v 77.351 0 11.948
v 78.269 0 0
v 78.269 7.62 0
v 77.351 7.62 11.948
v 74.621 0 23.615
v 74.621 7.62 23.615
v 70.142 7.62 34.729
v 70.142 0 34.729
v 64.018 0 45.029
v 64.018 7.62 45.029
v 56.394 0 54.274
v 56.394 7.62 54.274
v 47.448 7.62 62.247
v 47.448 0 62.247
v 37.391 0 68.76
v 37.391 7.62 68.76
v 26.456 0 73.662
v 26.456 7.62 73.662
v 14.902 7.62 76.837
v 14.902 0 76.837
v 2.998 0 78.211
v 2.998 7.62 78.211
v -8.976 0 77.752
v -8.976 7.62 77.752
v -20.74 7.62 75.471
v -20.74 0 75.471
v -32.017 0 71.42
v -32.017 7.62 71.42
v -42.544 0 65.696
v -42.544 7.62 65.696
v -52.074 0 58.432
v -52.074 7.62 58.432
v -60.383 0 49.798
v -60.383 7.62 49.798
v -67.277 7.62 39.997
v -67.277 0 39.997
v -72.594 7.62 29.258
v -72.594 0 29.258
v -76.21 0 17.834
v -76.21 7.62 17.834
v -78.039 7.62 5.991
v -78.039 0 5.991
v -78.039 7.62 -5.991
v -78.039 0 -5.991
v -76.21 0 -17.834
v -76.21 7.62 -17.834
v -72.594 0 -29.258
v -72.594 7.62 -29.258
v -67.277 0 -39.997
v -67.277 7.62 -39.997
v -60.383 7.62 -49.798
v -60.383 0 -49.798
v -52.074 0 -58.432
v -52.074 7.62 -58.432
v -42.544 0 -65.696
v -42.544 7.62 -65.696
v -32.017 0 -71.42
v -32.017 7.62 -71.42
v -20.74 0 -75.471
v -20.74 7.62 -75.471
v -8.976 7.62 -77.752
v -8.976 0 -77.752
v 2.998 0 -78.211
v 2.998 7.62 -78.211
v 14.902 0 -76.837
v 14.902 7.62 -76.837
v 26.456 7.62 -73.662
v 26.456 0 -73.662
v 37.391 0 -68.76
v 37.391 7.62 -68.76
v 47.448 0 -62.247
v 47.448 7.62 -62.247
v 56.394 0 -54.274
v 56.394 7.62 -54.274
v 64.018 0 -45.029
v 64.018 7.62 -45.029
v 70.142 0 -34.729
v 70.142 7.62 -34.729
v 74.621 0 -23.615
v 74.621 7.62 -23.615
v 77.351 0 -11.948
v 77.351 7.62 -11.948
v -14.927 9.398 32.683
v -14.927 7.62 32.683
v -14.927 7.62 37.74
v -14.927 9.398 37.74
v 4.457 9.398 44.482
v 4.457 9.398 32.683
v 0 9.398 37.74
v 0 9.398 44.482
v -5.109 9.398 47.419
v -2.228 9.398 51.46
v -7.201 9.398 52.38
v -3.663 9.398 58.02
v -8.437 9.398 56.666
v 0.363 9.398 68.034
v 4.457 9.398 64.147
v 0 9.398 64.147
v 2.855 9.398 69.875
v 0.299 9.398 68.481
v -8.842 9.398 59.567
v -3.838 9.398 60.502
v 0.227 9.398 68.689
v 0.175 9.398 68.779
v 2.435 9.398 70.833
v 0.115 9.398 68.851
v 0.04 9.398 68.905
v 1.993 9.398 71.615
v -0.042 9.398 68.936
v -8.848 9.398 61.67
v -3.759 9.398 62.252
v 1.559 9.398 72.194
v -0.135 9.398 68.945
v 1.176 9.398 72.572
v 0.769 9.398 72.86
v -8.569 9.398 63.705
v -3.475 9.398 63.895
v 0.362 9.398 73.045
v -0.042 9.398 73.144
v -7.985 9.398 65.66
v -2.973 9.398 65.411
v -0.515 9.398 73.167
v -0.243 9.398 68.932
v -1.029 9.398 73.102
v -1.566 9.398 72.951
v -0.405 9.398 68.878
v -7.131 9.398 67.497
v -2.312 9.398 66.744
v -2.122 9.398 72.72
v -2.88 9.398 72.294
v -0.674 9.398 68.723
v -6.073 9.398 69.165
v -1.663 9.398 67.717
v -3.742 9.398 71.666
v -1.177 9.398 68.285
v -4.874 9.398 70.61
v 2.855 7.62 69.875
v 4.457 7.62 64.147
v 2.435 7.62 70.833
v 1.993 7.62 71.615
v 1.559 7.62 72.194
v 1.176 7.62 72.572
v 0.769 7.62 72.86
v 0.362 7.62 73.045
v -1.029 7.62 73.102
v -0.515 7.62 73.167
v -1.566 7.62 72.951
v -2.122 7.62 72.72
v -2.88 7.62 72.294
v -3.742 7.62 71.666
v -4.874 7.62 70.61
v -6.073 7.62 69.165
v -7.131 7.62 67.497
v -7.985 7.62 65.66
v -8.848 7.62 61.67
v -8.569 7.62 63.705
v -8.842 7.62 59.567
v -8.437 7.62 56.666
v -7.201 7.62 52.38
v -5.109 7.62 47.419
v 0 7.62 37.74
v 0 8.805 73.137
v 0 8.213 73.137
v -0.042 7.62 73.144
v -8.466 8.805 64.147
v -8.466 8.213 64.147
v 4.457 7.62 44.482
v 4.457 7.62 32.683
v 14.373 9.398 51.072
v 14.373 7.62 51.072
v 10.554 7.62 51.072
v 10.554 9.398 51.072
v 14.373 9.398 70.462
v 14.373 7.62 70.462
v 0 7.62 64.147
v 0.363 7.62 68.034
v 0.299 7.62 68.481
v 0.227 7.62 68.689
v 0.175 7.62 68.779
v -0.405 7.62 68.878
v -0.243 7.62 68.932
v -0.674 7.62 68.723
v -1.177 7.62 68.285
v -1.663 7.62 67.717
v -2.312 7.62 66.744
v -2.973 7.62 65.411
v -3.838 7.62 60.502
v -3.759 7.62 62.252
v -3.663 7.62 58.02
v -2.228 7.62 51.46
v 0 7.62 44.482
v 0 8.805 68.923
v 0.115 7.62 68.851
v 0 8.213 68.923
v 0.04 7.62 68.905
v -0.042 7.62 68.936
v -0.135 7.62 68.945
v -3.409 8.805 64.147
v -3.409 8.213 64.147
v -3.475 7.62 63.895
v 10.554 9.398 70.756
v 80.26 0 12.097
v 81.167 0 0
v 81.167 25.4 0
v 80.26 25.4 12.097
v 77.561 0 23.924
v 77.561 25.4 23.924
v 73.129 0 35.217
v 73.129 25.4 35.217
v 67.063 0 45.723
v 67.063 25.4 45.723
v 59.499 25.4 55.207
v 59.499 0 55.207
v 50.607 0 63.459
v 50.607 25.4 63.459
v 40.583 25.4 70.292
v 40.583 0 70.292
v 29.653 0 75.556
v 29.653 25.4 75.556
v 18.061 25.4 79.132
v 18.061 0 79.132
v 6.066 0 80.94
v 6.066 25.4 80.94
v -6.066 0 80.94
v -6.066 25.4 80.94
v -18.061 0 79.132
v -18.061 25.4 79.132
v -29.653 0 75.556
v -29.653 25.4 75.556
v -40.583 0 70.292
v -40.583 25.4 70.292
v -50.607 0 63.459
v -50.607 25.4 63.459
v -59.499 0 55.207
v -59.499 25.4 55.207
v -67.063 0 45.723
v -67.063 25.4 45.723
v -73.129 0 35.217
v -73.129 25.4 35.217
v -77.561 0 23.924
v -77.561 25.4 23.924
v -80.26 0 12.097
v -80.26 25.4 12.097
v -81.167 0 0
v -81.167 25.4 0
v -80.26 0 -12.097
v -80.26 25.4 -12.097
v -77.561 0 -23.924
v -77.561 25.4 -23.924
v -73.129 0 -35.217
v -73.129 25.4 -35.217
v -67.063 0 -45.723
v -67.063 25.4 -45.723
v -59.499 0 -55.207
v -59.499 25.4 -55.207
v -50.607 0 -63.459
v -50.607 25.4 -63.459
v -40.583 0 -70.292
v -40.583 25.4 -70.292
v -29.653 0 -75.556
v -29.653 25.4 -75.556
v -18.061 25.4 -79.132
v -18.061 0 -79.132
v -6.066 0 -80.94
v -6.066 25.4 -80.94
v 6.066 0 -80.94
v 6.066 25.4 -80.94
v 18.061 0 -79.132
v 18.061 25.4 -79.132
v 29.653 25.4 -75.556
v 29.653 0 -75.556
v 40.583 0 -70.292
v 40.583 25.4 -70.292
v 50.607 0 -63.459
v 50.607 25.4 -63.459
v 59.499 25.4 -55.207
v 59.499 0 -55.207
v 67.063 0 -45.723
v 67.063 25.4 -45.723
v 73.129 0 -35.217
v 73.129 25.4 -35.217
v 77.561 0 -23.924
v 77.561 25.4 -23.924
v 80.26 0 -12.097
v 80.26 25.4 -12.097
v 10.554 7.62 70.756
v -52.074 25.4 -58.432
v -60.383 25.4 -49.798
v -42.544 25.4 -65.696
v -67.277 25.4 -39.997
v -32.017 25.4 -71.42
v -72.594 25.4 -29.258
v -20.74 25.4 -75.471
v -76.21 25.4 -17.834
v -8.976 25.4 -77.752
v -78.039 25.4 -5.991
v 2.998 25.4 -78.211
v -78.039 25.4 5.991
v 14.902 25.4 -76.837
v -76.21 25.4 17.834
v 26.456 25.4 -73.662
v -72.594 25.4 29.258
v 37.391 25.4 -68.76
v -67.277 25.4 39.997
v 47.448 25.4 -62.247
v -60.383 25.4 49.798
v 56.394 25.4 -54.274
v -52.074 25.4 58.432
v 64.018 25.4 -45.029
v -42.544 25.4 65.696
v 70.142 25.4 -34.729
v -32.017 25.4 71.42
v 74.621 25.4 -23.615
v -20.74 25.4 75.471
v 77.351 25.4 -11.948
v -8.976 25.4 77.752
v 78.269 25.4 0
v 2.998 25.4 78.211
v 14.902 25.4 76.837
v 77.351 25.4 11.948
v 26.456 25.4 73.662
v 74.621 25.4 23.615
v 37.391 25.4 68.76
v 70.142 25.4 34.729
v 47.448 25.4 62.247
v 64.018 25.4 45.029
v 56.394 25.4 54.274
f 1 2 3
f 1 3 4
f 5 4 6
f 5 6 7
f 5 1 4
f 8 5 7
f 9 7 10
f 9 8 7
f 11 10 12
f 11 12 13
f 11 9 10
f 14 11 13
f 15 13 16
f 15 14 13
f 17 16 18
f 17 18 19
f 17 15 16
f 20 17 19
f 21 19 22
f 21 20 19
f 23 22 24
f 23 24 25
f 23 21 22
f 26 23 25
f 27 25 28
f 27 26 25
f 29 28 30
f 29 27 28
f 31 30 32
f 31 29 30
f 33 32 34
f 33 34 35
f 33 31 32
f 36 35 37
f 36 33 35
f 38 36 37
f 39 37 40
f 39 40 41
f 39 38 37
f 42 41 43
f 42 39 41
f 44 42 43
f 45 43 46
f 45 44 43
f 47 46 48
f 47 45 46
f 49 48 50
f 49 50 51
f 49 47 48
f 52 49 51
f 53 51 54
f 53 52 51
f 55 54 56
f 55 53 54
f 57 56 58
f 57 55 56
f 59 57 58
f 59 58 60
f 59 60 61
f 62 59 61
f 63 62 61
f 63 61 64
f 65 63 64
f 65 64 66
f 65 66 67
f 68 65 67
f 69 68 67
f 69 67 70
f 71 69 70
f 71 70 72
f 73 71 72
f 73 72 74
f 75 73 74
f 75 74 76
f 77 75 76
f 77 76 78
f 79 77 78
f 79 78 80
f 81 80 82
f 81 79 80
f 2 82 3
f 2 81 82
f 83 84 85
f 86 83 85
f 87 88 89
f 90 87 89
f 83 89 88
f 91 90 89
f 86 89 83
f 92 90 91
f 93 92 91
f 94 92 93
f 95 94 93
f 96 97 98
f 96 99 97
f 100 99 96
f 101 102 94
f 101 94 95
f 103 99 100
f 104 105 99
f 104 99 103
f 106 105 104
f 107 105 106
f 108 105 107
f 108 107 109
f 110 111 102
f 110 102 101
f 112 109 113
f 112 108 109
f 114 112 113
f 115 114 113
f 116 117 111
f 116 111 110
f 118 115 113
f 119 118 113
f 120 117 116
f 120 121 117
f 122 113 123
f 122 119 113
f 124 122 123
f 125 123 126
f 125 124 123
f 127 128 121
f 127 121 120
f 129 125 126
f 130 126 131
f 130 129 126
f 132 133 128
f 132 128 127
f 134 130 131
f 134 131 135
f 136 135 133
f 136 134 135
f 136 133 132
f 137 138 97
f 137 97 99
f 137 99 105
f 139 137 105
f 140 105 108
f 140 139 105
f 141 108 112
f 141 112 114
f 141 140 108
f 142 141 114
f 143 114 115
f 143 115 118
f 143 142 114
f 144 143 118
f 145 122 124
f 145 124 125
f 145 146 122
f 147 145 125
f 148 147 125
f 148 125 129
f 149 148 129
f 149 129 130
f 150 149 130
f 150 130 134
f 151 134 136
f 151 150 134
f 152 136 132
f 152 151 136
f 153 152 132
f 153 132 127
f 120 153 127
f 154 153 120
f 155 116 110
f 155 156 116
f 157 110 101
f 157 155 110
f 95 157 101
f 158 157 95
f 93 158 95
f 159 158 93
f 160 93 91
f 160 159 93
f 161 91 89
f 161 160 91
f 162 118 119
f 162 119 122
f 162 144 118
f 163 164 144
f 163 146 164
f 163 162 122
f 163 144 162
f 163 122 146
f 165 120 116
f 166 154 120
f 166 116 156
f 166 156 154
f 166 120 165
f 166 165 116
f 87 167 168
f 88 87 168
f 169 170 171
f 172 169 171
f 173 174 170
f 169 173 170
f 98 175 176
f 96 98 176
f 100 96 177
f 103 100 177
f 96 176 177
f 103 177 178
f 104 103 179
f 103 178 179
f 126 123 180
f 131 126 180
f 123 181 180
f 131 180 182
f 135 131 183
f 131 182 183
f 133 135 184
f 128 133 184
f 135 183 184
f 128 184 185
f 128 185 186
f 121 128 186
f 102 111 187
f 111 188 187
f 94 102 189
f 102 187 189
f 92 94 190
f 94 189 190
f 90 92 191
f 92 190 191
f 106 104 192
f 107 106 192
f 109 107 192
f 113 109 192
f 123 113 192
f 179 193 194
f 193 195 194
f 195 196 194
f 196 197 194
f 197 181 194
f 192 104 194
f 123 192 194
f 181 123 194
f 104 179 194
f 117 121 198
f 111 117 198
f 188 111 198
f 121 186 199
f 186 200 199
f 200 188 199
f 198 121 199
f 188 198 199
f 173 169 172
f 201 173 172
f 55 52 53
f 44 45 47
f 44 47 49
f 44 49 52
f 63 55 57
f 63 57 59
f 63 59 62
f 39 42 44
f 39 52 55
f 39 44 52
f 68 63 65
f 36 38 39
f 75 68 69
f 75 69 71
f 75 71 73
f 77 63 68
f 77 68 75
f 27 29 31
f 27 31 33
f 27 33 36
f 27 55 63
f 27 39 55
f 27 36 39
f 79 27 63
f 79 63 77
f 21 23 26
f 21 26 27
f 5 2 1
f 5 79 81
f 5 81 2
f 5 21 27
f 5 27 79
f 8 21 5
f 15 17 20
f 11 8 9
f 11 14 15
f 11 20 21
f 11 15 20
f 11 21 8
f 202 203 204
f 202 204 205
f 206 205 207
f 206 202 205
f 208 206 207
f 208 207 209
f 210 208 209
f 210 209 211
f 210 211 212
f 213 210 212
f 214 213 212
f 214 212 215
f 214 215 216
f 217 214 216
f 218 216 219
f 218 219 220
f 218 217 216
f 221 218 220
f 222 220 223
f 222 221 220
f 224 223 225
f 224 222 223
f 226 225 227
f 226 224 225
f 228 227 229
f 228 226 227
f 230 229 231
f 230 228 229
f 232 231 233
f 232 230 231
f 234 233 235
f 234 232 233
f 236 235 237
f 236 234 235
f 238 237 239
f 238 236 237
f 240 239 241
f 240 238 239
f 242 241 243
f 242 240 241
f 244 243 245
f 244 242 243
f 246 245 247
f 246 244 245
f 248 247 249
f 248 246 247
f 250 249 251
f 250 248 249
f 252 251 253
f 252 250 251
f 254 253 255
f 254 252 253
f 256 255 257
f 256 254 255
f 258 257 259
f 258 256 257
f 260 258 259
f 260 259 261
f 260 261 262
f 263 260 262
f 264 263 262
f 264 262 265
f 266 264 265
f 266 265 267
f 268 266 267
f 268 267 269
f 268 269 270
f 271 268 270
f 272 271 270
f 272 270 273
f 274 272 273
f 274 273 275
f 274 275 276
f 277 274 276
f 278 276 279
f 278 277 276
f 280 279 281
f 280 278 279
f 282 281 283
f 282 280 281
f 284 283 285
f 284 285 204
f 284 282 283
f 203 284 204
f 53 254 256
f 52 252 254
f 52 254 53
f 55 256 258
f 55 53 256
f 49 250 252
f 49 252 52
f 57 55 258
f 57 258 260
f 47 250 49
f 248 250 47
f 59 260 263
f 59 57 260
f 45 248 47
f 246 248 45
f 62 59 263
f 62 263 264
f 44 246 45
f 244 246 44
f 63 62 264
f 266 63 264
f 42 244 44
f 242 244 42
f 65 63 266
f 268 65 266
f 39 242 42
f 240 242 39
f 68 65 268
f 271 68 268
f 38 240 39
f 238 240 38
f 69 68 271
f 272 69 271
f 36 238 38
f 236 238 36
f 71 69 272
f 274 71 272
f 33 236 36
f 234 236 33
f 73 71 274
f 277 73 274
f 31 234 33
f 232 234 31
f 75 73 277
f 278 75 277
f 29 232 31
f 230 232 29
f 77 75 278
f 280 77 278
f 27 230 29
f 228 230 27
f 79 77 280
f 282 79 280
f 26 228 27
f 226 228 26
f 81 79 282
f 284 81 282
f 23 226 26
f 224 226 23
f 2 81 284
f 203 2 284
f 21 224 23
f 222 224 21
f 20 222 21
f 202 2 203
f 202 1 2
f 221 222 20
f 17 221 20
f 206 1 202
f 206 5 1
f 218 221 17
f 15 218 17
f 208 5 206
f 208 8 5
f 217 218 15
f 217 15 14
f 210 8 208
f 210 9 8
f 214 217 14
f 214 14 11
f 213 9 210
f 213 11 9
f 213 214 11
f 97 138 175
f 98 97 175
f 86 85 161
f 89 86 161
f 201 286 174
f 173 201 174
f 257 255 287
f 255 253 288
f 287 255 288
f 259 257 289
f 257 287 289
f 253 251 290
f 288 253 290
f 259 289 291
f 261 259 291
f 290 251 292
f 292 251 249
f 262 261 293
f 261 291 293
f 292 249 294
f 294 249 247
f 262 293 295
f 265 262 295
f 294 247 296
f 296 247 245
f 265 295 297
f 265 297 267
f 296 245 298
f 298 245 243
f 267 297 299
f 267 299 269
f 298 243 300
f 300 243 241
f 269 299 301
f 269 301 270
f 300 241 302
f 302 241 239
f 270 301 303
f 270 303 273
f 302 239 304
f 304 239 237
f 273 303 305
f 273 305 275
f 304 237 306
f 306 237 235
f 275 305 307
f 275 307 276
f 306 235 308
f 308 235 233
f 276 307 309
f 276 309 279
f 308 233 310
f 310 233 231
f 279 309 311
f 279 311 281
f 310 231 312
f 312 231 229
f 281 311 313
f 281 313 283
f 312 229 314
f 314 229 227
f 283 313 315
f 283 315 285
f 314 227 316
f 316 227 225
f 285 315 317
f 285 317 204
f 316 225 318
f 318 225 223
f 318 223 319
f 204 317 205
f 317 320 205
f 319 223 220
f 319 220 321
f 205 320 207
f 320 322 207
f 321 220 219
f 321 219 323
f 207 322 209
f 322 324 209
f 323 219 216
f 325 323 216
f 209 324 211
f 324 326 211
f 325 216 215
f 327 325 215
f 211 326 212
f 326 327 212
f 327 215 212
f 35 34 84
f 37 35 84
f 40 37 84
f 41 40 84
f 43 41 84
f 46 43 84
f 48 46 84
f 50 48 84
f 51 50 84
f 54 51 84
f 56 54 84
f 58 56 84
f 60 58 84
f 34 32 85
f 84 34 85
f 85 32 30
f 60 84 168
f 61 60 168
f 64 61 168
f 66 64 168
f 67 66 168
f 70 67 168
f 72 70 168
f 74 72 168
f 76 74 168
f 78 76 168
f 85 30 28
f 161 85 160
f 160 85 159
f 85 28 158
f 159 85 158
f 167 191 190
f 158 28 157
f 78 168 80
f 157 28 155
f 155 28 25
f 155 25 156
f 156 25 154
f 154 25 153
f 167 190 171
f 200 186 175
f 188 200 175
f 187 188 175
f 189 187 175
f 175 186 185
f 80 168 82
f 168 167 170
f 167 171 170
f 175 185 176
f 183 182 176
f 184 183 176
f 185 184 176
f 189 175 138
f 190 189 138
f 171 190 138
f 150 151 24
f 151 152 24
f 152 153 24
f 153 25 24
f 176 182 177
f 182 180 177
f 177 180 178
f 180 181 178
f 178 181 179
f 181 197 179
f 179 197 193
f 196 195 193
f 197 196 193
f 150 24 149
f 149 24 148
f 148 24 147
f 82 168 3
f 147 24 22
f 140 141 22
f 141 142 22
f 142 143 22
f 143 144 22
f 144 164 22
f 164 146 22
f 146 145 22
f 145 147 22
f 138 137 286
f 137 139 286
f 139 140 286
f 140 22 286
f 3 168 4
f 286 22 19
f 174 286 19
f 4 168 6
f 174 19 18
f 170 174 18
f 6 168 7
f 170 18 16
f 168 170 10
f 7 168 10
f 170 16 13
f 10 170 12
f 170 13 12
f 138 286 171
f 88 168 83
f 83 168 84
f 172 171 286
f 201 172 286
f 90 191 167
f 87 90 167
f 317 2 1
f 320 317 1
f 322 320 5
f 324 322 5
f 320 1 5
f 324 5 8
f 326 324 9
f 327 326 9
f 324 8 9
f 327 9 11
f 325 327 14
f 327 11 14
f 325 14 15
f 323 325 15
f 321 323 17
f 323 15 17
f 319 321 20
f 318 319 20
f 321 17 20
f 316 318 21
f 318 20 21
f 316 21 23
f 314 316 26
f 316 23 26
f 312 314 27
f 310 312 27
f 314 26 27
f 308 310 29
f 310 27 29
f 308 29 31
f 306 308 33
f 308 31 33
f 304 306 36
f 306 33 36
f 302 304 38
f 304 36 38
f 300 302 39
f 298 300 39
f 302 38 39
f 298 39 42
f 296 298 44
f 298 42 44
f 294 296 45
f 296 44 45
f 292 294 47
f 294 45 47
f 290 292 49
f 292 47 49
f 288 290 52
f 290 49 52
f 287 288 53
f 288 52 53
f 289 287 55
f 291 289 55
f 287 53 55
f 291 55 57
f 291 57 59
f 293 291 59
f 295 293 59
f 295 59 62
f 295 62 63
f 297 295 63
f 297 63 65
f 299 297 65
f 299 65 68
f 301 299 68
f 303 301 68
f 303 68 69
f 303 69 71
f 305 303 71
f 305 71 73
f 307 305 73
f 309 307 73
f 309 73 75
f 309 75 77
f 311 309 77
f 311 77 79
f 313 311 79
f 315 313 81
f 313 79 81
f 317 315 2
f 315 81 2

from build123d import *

# Parameters (mm, degrees)
F0_R     = 81.1666052838
F0_R_2   = 78.2687130008
F1_DEPTH = 25.4
F2_DEPTH = 7.62
F4_DEPTH = 1.778


with BuildPart() as f1:
    # F0 (on Front) → F1 (new body)
    with BuildSketch(Plane.XZ):
        Circle(F0_R)
        Circle(F0_R_2, mode=Mode.SUBTRACT)
    extrude(amount=-F1_DEPTH)


with BuildPart() as f2:
    # F0 (on Front) → F2 (new body)
    with BuildSketch(Plane.XZ):
        Circle(F0_R_2)
    extrude(amount=-F2_DEPTH)

    # F3 (on face) → F4 (join)
    with BuildSketch(Plane(origin=(0, 7.62, 0), x_dir=(-1, 0, 0), z_dir=(0, 1, 0))):
        Polygon((-10.5537576601, 70.7562640309), (-14.3730528653, 70.4624727368), (-14.3730528653, 51.0722063482), (-10.5537576601, 51.0722063482), align=None)
        with BuildLine():
            Line((-4.4572395273, 64.1473084688), (0, 64.1473084688))
            add(Edge.make_bspline(
                [(0, 64.1473084688), (-0.3239775419, 66.4147667703), (-1.0070591788, 71.1955275563), (6.1574537097, 62.8676957006), (2.4220884556, 51.7142923801), (0, 44.4821938872)],
                knots=[0, 0, 0, 0, 0.2408073508, 0.5077237094, 1, 1, 1, 1], degree=3))
            Line((0, 44.4821938872), (-4.4572395273, 44.4821938872))
            Line((-4.4572395273, 44.4821938872), (-4.4572395273, 32.6831303537))
            Line((-4.4572395273, 32.6831303537), (14.9269392714, 32.6831303537))
            Line((14.9269392714, 32.6831303537), (14.9269392714, 37.7398729324))
            Line((14.9269392714, 37.7398729324), (0, 37.7398729324))
            add(Edge.make_bspline(
                [(-4.4572395273, 64.1473084688), (-3.4485570444, 68.4396628198), (-1.3209009983, 77.4937049409), (13.8701505565, 62.7562359896), (5.2000749142, 47.1187878511), (0, 37.7398729324)],
                knots=[0, 0, 0, 0, 0.26512685, 0.5592431266, 1, 1, 1, 1], degree=3))
        make_face()
    extrude(amount=F4_DEPTH)


solid = Compound([f1.part, f2.part])
